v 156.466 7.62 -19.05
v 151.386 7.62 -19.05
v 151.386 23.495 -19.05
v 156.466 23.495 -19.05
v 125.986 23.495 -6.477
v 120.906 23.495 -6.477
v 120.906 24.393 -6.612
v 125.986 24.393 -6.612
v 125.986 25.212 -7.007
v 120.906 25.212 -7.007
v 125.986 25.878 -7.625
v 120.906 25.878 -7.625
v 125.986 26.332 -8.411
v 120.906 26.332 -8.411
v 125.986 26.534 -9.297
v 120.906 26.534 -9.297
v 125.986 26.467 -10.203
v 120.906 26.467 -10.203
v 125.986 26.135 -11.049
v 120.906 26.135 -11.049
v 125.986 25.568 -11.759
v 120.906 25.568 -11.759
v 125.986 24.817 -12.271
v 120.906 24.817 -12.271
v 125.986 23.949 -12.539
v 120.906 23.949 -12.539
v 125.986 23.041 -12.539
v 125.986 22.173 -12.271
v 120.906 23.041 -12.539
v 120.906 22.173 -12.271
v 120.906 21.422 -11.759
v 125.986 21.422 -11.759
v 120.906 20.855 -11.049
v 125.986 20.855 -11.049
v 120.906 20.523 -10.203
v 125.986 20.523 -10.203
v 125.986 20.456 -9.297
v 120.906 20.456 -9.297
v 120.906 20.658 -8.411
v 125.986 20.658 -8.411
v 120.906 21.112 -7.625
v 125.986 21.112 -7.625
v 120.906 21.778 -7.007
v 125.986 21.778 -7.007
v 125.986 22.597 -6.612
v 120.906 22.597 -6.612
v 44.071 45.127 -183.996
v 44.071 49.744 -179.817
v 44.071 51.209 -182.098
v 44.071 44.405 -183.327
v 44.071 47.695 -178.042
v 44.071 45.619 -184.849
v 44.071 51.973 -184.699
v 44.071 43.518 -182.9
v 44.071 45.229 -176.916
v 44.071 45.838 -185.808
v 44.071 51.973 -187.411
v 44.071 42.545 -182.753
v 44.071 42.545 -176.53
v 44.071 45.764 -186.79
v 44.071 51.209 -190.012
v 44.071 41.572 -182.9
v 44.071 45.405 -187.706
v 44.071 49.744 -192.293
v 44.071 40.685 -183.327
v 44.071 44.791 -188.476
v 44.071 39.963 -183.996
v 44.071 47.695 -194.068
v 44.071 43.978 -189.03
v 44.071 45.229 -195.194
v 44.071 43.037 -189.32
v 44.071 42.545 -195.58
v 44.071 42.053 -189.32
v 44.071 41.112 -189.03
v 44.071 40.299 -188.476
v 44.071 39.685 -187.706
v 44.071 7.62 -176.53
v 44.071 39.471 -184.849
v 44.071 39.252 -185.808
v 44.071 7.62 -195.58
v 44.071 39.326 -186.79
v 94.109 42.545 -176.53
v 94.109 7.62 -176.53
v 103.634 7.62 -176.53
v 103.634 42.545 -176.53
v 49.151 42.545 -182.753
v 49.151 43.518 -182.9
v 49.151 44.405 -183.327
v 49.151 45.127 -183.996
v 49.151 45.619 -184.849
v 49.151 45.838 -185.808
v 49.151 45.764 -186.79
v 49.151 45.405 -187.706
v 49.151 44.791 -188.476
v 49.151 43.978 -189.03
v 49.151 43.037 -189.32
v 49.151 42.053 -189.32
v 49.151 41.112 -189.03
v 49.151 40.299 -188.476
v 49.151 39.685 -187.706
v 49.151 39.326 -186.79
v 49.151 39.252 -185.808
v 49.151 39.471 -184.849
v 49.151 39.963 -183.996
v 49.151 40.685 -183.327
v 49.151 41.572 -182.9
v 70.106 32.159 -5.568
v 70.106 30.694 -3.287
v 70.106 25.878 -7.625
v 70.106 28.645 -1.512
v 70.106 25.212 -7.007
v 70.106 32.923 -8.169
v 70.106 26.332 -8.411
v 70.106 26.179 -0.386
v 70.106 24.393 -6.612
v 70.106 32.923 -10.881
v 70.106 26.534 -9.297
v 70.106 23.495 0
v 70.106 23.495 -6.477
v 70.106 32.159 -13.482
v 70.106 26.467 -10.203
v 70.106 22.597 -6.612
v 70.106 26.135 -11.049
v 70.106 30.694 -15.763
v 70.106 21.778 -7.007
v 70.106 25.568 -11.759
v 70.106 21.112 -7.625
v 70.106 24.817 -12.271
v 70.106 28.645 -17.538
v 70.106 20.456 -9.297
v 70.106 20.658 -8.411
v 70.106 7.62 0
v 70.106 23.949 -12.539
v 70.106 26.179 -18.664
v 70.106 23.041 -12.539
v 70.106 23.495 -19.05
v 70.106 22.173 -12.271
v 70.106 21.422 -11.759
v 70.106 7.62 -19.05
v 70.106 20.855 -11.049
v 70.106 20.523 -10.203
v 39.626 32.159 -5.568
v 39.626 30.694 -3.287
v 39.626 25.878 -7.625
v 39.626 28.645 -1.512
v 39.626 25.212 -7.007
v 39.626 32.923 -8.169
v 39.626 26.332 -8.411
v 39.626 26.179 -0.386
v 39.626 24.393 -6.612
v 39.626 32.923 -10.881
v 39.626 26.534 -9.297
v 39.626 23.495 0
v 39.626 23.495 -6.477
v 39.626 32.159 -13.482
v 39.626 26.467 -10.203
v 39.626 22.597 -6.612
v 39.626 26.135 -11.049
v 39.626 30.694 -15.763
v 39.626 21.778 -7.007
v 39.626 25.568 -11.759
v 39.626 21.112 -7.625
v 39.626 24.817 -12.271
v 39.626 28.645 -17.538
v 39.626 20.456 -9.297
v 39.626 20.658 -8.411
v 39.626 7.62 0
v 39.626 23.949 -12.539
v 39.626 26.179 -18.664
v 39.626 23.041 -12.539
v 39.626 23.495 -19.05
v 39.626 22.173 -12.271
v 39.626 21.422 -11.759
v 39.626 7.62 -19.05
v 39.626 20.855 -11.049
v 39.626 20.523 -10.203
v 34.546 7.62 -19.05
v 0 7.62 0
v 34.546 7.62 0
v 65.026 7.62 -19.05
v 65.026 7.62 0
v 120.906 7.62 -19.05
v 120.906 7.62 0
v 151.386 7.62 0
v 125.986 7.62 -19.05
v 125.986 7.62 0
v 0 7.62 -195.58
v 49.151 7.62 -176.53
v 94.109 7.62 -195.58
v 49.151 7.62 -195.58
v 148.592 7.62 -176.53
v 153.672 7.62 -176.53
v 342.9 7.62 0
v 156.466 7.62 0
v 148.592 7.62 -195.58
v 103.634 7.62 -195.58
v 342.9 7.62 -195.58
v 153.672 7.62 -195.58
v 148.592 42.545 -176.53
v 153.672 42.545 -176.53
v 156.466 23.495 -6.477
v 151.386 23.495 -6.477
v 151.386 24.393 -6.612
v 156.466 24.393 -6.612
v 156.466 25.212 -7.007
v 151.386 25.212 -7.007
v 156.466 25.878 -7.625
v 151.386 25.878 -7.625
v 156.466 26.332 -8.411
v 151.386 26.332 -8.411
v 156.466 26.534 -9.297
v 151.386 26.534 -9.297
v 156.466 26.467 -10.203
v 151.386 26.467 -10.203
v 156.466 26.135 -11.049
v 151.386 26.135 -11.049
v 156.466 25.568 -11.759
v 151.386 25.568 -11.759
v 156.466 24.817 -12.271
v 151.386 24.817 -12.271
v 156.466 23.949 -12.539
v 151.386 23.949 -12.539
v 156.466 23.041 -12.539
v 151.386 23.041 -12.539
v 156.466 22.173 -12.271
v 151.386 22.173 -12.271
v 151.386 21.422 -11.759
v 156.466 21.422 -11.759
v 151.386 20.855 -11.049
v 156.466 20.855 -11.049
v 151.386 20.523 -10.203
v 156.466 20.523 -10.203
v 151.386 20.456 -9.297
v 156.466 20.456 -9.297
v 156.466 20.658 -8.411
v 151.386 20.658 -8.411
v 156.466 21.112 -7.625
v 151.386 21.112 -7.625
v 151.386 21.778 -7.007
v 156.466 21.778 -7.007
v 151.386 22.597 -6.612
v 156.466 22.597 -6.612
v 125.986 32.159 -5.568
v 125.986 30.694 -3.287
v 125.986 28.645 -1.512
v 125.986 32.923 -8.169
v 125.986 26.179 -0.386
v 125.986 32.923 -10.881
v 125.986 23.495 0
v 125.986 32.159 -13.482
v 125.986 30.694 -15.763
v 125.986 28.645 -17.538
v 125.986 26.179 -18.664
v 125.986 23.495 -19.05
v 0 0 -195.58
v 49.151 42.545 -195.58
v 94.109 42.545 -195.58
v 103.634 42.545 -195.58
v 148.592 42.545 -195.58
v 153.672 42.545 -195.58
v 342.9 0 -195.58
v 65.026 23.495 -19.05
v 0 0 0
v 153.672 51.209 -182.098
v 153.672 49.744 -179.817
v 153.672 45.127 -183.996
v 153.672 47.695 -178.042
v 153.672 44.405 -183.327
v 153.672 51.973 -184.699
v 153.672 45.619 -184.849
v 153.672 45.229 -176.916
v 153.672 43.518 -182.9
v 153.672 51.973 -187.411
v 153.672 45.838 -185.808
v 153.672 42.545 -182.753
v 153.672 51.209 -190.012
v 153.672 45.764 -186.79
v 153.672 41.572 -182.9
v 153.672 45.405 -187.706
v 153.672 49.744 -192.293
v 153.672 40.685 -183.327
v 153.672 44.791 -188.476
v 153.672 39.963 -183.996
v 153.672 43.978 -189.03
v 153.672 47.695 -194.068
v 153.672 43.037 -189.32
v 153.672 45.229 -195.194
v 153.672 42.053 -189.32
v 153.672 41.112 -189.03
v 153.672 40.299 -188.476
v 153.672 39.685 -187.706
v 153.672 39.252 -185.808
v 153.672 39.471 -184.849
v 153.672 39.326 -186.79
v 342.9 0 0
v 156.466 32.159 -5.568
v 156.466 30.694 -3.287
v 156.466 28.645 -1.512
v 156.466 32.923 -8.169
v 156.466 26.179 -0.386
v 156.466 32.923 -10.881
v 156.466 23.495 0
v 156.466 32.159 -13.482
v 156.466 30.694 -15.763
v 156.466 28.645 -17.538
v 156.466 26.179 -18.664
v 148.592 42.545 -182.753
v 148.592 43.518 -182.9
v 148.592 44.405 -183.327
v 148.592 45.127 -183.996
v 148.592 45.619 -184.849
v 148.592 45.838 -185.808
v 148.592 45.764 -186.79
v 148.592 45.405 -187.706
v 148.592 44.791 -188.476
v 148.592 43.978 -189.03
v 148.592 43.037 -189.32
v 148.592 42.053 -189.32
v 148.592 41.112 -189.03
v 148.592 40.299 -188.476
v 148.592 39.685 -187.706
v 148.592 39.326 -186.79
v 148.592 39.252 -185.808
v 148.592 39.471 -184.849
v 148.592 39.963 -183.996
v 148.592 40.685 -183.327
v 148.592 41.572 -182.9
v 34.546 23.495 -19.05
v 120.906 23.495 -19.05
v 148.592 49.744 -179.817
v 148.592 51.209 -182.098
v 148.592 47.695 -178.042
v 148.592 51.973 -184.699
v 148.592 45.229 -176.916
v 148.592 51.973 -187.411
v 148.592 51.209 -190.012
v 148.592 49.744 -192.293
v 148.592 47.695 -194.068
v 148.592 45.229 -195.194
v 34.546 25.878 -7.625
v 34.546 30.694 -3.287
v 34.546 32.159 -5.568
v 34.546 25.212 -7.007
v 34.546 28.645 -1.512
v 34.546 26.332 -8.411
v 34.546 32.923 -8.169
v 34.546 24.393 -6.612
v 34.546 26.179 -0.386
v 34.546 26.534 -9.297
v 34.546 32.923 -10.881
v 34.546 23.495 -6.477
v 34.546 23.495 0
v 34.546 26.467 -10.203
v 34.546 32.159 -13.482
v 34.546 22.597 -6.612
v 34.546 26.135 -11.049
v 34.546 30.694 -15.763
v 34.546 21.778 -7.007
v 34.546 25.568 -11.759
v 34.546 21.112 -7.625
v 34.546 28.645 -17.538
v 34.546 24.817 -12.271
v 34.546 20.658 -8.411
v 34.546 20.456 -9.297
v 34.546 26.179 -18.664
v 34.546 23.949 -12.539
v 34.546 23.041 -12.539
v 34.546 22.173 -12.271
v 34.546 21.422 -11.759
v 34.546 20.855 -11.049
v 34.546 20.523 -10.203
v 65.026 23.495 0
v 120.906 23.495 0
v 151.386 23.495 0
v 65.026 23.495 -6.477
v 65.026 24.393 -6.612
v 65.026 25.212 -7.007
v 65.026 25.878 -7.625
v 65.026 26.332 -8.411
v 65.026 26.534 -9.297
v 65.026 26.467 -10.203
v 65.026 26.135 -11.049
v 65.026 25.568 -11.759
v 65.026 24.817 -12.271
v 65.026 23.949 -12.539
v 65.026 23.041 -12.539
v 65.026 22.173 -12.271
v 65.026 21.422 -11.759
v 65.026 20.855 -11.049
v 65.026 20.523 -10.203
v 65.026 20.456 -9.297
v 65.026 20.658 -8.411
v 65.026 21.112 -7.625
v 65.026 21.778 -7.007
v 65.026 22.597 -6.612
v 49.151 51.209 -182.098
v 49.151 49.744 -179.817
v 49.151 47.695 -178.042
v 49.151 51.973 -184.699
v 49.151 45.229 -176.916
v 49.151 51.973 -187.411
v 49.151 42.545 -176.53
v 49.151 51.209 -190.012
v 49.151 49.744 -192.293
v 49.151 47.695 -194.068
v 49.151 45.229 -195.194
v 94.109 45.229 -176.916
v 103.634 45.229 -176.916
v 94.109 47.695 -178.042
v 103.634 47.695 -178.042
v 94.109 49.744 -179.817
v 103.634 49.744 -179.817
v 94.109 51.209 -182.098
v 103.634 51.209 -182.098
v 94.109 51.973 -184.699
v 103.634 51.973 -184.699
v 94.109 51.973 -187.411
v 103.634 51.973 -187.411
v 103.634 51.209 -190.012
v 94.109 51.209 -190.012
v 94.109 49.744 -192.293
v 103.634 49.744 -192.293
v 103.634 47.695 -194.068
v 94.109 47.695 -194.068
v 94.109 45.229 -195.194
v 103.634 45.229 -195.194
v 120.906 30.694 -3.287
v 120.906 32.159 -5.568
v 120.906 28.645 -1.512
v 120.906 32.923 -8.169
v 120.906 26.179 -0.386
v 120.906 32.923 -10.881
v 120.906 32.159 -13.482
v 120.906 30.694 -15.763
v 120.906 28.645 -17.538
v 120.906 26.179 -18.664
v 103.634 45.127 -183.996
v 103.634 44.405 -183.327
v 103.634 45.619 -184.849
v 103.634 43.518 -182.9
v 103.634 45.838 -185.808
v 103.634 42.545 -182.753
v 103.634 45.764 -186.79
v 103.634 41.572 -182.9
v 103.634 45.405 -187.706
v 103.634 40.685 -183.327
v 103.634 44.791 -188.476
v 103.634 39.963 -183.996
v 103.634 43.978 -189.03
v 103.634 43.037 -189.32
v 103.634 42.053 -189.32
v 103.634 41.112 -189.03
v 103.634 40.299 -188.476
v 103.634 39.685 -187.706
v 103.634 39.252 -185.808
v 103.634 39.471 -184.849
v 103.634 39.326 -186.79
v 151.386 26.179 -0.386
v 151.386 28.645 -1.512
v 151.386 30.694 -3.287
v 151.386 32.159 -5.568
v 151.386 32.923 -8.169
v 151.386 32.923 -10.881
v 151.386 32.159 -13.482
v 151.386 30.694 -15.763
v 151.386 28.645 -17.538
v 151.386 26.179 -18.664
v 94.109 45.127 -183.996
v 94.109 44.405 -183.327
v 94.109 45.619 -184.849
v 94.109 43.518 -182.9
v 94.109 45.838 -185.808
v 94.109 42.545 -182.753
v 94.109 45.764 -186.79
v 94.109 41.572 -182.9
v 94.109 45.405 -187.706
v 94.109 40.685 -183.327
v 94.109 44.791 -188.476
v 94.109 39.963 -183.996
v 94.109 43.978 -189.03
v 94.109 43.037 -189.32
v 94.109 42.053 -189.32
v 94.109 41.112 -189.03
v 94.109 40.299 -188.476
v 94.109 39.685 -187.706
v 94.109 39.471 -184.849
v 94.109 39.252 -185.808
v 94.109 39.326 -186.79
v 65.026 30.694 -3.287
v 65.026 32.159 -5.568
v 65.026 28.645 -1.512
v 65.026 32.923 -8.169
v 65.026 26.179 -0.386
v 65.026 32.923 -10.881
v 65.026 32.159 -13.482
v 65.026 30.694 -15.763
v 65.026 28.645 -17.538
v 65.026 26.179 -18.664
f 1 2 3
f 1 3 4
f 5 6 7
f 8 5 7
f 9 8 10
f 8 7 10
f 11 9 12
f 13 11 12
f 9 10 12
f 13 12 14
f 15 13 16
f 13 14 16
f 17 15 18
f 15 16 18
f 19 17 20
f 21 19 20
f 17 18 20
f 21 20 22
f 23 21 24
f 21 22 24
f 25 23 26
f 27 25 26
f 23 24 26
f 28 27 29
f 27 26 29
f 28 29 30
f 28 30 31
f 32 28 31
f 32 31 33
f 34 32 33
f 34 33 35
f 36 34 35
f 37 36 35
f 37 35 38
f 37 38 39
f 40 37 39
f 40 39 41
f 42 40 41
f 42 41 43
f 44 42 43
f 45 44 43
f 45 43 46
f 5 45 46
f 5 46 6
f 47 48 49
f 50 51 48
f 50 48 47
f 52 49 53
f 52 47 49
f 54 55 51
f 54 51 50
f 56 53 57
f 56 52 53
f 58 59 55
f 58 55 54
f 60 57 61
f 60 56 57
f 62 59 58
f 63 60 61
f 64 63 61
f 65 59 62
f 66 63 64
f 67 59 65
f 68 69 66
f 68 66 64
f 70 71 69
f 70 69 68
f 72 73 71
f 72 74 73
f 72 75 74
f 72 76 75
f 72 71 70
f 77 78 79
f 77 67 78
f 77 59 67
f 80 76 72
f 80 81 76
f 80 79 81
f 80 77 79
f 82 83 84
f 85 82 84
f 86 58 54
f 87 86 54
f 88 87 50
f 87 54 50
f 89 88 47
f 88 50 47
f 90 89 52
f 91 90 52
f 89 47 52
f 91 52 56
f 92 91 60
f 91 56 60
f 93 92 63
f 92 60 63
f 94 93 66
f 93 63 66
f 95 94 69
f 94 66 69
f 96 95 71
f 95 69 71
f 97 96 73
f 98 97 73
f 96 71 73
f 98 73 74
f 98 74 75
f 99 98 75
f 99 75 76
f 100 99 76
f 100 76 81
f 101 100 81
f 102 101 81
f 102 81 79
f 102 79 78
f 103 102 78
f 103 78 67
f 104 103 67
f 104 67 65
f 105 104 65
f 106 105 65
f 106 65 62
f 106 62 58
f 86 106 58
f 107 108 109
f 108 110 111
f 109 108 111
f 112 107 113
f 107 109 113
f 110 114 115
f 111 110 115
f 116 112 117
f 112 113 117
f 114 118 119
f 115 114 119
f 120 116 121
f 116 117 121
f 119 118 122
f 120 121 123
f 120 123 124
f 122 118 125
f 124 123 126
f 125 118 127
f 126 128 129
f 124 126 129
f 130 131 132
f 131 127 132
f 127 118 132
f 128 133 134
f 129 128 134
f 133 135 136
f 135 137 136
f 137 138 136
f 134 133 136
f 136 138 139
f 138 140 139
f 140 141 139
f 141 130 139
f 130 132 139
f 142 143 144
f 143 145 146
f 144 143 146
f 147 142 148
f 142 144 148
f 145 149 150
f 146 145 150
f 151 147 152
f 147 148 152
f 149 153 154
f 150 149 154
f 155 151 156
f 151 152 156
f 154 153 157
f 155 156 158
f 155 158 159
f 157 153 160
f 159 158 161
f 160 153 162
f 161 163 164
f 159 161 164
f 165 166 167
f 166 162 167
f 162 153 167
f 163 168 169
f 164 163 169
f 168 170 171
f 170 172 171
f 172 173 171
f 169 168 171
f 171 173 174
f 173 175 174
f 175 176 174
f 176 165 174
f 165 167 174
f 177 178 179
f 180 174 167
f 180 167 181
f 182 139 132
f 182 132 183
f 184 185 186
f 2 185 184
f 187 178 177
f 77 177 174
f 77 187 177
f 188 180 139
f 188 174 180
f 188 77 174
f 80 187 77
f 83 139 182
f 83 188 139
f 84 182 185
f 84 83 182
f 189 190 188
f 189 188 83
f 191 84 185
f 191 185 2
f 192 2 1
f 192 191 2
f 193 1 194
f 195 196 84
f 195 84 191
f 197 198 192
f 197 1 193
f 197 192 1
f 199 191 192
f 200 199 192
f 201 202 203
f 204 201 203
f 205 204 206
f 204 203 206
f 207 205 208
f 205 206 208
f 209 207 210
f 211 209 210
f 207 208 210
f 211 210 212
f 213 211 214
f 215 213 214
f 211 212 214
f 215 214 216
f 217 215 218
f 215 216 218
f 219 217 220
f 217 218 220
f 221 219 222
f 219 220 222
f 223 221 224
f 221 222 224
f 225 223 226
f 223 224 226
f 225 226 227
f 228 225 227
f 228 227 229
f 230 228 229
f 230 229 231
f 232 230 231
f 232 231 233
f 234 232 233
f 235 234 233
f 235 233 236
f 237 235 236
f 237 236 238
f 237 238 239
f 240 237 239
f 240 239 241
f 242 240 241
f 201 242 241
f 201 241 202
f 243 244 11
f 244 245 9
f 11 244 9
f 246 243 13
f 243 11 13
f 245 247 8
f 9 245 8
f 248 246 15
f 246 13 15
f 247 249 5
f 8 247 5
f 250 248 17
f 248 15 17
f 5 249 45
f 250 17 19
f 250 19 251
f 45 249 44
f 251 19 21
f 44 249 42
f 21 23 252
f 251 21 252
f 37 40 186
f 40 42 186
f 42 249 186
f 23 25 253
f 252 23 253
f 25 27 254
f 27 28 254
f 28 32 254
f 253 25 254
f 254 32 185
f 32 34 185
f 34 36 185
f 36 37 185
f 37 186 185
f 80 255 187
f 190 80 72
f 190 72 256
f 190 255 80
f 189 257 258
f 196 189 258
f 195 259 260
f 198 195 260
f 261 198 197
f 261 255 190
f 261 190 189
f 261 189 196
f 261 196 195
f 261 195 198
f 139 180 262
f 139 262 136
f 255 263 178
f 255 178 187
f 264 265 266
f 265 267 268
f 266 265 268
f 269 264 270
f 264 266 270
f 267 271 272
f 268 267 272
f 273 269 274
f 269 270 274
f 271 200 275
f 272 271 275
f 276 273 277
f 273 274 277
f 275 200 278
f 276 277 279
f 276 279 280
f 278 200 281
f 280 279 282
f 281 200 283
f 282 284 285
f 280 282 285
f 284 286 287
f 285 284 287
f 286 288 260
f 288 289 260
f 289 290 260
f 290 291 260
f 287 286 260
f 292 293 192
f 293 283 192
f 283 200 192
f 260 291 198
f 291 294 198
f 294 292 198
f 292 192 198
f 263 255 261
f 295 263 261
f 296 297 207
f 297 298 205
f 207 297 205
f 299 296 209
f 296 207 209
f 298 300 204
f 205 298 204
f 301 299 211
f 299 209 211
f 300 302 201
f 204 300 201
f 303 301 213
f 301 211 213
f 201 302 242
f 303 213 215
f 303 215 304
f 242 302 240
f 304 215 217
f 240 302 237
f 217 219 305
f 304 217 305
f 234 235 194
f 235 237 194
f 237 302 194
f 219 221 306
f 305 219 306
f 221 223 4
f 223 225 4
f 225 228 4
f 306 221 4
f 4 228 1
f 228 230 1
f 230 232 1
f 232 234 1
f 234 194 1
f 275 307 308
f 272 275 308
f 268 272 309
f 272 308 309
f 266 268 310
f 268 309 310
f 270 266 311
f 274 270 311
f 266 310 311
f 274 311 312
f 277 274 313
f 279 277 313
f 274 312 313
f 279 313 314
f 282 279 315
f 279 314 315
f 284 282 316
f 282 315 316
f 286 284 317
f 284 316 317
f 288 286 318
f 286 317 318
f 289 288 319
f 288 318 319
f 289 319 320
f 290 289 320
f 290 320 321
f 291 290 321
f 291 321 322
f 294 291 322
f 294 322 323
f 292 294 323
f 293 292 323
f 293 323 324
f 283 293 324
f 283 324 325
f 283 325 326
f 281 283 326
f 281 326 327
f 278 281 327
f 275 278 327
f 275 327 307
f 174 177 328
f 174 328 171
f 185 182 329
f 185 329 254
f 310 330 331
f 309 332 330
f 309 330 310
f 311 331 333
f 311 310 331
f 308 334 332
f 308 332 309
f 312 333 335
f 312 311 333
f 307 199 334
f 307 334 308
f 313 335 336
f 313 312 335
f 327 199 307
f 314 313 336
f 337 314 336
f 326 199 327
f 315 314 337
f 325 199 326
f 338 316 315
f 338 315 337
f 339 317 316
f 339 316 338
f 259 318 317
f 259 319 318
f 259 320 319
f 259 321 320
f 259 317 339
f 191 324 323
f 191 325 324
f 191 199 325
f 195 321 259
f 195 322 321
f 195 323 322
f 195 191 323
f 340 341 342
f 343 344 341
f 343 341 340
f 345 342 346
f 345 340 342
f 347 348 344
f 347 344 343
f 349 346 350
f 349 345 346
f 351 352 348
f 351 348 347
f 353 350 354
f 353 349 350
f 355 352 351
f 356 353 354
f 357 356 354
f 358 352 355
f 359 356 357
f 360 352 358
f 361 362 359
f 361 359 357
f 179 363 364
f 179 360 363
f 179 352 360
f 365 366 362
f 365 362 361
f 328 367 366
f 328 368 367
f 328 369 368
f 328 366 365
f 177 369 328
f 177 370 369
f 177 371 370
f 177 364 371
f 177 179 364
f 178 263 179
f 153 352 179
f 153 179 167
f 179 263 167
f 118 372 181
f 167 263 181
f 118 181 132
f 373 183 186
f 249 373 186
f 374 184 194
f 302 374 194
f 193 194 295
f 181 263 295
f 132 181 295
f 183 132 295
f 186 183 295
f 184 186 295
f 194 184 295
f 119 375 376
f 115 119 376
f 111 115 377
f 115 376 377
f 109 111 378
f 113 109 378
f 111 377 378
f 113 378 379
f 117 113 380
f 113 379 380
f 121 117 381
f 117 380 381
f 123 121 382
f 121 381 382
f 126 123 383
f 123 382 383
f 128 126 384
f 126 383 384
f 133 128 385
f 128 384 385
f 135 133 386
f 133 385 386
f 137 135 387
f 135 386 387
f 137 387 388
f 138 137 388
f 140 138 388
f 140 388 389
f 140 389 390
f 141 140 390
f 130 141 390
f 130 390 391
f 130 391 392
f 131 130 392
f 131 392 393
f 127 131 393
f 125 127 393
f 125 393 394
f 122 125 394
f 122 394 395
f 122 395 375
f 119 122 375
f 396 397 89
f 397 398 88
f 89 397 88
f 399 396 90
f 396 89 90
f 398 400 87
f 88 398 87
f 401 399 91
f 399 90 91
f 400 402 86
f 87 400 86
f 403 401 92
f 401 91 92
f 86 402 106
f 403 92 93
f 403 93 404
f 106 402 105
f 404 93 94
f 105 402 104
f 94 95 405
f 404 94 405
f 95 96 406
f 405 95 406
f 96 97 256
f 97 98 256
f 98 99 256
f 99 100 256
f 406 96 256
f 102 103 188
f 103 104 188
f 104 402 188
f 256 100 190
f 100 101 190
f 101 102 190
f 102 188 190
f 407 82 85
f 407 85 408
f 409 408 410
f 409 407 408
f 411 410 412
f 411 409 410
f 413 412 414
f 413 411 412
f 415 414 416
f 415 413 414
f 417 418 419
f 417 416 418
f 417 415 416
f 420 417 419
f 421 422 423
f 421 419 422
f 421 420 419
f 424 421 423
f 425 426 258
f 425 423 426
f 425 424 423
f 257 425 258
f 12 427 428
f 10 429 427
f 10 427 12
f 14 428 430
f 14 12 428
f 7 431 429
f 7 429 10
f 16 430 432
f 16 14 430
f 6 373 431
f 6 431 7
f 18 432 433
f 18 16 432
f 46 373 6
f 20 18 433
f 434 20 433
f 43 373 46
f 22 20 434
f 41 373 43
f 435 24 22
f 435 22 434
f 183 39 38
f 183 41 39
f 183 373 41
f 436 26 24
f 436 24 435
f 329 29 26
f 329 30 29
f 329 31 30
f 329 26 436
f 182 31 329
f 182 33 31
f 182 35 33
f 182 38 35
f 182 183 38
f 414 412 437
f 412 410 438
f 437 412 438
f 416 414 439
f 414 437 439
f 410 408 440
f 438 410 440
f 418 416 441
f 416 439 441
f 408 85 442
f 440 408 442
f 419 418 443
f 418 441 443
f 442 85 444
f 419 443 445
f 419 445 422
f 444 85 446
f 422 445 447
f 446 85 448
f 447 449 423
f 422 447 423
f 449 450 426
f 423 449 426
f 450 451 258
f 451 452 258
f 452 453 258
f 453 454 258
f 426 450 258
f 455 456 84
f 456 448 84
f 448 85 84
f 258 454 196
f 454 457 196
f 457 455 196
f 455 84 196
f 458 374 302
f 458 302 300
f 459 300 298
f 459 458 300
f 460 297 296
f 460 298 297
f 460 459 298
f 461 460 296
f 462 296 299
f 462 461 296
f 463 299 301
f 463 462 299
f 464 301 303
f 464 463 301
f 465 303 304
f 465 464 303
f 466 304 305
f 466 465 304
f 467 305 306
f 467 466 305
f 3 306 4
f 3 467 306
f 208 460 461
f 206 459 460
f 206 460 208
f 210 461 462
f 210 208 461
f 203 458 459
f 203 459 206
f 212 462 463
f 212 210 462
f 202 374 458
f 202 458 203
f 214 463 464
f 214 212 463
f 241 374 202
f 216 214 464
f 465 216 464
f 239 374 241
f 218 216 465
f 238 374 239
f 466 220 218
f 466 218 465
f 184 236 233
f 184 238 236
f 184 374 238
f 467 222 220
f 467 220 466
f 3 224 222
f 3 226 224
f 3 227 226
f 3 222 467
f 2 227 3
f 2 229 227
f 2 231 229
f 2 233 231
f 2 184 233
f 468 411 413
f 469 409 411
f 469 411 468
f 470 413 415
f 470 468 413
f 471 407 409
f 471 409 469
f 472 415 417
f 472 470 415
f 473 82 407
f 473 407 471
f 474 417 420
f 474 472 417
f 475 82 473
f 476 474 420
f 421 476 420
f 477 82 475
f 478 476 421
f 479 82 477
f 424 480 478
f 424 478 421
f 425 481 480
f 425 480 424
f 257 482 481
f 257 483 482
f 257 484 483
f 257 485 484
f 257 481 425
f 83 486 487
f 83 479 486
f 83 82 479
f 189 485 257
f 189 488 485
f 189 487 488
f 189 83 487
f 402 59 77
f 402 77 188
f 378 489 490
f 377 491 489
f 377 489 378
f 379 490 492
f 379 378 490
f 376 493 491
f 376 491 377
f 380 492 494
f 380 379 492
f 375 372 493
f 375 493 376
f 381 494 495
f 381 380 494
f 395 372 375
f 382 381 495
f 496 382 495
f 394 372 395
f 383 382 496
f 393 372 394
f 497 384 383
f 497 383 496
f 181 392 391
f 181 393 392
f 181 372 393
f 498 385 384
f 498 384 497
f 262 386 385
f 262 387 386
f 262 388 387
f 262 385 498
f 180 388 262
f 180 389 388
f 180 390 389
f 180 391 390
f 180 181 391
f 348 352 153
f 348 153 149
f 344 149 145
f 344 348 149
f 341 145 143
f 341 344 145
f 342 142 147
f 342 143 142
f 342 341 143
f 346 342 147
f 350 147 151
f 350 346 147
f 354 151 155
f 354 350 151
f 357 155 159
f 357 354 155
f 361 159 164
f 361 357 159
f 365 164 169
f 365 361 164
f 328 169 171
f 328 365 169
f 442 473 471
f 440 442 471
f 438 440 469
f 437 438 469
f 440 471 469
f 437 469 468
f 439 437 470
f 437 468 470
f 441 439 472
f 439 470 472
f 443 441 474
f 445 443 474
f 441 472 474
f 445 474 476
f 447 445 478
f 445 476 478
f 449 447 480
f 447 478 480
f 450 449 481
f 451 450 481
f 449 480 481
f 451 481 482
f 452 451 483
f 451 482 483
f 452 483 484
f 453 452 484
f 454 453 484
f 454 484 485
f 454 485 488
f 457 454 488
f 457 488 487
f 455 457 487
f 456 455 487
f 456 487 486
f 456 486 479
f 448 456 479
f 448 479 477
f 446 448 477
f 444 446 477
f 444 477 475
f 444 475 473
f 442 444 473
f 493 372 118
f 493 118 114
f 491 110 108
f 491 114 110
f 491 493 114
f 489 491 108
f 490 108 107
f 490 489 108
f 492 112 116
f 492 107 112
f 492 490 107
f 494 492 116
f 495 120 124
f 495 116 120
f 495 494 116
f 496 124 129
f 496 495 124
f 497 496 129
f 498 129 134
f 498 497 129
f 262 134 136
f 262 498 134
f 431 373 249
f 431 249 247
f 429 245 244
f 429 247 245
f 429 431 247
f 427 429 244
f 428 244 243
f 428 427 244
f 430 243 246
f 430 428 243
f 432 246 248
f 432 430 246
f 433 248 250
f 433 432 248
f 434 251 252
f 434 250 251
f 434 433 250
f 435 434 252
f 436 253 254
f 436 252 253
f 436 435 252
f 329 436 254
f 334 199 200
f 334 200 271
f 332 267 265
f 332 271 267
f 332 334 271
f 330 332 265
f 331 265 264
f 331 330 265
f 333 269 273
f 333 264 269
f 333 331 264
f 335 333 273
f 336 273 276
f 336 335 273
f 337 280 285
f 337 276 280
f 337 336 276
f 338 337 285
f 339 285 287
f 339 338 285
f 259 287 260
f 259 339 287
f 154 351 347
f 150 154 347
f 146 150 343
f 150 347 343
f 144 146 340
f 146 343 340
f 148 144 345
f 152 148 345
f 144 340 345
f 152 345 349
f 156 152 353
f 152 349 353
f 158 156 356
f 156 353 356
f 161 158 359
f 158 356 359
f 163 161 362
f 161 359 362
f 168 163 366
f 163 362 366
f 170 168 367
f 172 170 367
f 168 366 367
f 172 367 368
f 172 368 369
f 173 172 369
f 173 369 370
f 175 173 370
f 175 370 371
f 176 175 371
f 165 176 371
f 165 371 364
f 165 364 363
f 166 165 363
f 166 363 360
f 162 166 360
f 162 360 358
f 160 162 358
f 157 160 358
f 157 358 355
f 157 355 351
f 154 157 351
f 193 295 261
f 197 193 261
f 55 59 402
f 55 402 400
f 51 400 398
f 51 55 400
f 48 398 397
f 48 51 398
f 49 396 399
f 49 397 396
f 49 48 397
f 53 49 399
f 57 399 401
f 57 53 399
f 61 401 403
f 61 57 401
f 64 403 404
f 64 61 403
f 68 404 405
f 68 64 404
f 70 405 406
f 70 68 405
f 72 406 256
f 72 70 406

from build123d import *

# Parameters (mm, degrees)
SKETCH1_W               = 342.9
SKETCH1_H               = 195.58
BOSS_EXTRUDE1_DEPTH     = 7.62
SKETCH2_W               = 5.08
SKETCH2_H               = 19.05
BOSS_EXTRUDE2_DEPTH     = 25.4
SKETCH3_R               = 3.048
CUT_EXTRUDE1_DEPTH      = 367.63858527
SKETCH2_4_W             = 5.08
SKETCH2_4_H             = 19.05
SKETCH2_4_W_2           = 9.525
BOSS_EXTRUDE3_DEPTH     = 44.45
CUT_EXTRUDE2_DEPTH      = 361.917448488
CUT_EXTRUDE2_DEPTH_BACK = 492.252
SKETCH4_R               = 3.302


with BuildPart() as part:
    # Sketch1 → Boss-Extrude1 (new body)
    with BuildSketch(Plane(origin=(0, 0, 0), x_dir=(1, 0, 0), z_dir=(0, 1, 0))):
        with Locations((171.45, 97.79)):
            Rectangle(SKETCH1_W, SKETCH1_H)
    extrude(amount=BOSS_EXTRUDE1_DEPTH)

    # Sketch2 → Boss-Extrude2 (add)
    with BuildSketch(Plane(origin=(0, 7.62, 0), x_dir=(1, 0, 0), z_dir=(0, 1, 0))):
        with Locations((37.086314424, 9.525)):
            Rectangle(SKETCH2_W, SKETCH2_H)
        with Locations((153.926314424, 9.525)):
            Rectangle(SKETCH2_W, SKETCH2_H)
        with Locations((123.446314424, 9.525)):
            Rectangle(SKETCH2_W, SKETCH2_H)
        with Locations((67.566314424, 9.525)):
            Rectangle(SKETCH2_W, SKETCH2_H)
    extrude(amount=BOSS_EXTRUDE2_DEPTH)

    # Sketch3 → Cut-Extrude1 (cut, through all)
    with BuildSketch(Plane.ZY.offset(-34.546314424)):
        with Locations((-9.525, 23.495)):
            Circle(SKETCH3_R)
        with BuildLine():
            Line((-19.05, 23.495), (-20.422011891, 33.02))
            Line((-20.422011891, 33.02), (2.969055393, 35.880507904))
            Line((2.969055393, 35.880507904), (0, 23.495))
            ThreePointArc((0, 23.495), (-9.525, 33.02), (-19.05, 23.495))
        make_face()
    extrude(amount=-CUT_EXTRUDE1_DEPTH, mode=Mode.SUBTRACT)

    # Sketch2<4> → Boss-Extrude3 (add)
    with BuildSketch(Plane(origin=(0, 7.62, 0), x_dir=(1, 0, 0), z_dir=(0, 1, 0))):
        with Locations((46.611314424, 186.055)):
            Rectangle(SKETCH2_4_W, SKETCH2_4_H)
        with Locations((151.132314424, 186.055)):
            Rectangle(SKETCH2_4_W, SKETCH2_4_H)
        with Locations((98.871814424, 186.055)):
            Rectangle(SKETCH2_4_W_2, SKETCH2_4_H)
    extrude(amount=BOSS_EXTRUDE3_DEPTH)

    # Sketch4 → Cut-Extrude2 (cut, two sides: drawn at the far end of the back side and taken through both)
    with BuildSketch(Plane.ZY.offset(-44.071314424).offset(-CUT_EXTRUDE2_DEPTH_BACK)):
        with Locations((-186.055, 42.545)):
            Circle(SKETCH4_R)
        with BuildLine():
            Line((-195.58, 42.545), (-197.59428292, 55.074082425))
            Line((-197.59428292, 55.074082425), (-172.116639762, 54.451508438))
            Line((-172.116639762, 54.451508438), (-176.53, 42.545))
            ThreePointArc((-176.53, 42.545), (-186.055, 52.07), (-195.58, 42.545))
        make_face()
    extrude(amount=CUT_EXTRUDE2_DEPTH + CUT_EXTRUDE2_DEPTH_BACK, mode=Mode.SUBTRACT)


solid = part.part
